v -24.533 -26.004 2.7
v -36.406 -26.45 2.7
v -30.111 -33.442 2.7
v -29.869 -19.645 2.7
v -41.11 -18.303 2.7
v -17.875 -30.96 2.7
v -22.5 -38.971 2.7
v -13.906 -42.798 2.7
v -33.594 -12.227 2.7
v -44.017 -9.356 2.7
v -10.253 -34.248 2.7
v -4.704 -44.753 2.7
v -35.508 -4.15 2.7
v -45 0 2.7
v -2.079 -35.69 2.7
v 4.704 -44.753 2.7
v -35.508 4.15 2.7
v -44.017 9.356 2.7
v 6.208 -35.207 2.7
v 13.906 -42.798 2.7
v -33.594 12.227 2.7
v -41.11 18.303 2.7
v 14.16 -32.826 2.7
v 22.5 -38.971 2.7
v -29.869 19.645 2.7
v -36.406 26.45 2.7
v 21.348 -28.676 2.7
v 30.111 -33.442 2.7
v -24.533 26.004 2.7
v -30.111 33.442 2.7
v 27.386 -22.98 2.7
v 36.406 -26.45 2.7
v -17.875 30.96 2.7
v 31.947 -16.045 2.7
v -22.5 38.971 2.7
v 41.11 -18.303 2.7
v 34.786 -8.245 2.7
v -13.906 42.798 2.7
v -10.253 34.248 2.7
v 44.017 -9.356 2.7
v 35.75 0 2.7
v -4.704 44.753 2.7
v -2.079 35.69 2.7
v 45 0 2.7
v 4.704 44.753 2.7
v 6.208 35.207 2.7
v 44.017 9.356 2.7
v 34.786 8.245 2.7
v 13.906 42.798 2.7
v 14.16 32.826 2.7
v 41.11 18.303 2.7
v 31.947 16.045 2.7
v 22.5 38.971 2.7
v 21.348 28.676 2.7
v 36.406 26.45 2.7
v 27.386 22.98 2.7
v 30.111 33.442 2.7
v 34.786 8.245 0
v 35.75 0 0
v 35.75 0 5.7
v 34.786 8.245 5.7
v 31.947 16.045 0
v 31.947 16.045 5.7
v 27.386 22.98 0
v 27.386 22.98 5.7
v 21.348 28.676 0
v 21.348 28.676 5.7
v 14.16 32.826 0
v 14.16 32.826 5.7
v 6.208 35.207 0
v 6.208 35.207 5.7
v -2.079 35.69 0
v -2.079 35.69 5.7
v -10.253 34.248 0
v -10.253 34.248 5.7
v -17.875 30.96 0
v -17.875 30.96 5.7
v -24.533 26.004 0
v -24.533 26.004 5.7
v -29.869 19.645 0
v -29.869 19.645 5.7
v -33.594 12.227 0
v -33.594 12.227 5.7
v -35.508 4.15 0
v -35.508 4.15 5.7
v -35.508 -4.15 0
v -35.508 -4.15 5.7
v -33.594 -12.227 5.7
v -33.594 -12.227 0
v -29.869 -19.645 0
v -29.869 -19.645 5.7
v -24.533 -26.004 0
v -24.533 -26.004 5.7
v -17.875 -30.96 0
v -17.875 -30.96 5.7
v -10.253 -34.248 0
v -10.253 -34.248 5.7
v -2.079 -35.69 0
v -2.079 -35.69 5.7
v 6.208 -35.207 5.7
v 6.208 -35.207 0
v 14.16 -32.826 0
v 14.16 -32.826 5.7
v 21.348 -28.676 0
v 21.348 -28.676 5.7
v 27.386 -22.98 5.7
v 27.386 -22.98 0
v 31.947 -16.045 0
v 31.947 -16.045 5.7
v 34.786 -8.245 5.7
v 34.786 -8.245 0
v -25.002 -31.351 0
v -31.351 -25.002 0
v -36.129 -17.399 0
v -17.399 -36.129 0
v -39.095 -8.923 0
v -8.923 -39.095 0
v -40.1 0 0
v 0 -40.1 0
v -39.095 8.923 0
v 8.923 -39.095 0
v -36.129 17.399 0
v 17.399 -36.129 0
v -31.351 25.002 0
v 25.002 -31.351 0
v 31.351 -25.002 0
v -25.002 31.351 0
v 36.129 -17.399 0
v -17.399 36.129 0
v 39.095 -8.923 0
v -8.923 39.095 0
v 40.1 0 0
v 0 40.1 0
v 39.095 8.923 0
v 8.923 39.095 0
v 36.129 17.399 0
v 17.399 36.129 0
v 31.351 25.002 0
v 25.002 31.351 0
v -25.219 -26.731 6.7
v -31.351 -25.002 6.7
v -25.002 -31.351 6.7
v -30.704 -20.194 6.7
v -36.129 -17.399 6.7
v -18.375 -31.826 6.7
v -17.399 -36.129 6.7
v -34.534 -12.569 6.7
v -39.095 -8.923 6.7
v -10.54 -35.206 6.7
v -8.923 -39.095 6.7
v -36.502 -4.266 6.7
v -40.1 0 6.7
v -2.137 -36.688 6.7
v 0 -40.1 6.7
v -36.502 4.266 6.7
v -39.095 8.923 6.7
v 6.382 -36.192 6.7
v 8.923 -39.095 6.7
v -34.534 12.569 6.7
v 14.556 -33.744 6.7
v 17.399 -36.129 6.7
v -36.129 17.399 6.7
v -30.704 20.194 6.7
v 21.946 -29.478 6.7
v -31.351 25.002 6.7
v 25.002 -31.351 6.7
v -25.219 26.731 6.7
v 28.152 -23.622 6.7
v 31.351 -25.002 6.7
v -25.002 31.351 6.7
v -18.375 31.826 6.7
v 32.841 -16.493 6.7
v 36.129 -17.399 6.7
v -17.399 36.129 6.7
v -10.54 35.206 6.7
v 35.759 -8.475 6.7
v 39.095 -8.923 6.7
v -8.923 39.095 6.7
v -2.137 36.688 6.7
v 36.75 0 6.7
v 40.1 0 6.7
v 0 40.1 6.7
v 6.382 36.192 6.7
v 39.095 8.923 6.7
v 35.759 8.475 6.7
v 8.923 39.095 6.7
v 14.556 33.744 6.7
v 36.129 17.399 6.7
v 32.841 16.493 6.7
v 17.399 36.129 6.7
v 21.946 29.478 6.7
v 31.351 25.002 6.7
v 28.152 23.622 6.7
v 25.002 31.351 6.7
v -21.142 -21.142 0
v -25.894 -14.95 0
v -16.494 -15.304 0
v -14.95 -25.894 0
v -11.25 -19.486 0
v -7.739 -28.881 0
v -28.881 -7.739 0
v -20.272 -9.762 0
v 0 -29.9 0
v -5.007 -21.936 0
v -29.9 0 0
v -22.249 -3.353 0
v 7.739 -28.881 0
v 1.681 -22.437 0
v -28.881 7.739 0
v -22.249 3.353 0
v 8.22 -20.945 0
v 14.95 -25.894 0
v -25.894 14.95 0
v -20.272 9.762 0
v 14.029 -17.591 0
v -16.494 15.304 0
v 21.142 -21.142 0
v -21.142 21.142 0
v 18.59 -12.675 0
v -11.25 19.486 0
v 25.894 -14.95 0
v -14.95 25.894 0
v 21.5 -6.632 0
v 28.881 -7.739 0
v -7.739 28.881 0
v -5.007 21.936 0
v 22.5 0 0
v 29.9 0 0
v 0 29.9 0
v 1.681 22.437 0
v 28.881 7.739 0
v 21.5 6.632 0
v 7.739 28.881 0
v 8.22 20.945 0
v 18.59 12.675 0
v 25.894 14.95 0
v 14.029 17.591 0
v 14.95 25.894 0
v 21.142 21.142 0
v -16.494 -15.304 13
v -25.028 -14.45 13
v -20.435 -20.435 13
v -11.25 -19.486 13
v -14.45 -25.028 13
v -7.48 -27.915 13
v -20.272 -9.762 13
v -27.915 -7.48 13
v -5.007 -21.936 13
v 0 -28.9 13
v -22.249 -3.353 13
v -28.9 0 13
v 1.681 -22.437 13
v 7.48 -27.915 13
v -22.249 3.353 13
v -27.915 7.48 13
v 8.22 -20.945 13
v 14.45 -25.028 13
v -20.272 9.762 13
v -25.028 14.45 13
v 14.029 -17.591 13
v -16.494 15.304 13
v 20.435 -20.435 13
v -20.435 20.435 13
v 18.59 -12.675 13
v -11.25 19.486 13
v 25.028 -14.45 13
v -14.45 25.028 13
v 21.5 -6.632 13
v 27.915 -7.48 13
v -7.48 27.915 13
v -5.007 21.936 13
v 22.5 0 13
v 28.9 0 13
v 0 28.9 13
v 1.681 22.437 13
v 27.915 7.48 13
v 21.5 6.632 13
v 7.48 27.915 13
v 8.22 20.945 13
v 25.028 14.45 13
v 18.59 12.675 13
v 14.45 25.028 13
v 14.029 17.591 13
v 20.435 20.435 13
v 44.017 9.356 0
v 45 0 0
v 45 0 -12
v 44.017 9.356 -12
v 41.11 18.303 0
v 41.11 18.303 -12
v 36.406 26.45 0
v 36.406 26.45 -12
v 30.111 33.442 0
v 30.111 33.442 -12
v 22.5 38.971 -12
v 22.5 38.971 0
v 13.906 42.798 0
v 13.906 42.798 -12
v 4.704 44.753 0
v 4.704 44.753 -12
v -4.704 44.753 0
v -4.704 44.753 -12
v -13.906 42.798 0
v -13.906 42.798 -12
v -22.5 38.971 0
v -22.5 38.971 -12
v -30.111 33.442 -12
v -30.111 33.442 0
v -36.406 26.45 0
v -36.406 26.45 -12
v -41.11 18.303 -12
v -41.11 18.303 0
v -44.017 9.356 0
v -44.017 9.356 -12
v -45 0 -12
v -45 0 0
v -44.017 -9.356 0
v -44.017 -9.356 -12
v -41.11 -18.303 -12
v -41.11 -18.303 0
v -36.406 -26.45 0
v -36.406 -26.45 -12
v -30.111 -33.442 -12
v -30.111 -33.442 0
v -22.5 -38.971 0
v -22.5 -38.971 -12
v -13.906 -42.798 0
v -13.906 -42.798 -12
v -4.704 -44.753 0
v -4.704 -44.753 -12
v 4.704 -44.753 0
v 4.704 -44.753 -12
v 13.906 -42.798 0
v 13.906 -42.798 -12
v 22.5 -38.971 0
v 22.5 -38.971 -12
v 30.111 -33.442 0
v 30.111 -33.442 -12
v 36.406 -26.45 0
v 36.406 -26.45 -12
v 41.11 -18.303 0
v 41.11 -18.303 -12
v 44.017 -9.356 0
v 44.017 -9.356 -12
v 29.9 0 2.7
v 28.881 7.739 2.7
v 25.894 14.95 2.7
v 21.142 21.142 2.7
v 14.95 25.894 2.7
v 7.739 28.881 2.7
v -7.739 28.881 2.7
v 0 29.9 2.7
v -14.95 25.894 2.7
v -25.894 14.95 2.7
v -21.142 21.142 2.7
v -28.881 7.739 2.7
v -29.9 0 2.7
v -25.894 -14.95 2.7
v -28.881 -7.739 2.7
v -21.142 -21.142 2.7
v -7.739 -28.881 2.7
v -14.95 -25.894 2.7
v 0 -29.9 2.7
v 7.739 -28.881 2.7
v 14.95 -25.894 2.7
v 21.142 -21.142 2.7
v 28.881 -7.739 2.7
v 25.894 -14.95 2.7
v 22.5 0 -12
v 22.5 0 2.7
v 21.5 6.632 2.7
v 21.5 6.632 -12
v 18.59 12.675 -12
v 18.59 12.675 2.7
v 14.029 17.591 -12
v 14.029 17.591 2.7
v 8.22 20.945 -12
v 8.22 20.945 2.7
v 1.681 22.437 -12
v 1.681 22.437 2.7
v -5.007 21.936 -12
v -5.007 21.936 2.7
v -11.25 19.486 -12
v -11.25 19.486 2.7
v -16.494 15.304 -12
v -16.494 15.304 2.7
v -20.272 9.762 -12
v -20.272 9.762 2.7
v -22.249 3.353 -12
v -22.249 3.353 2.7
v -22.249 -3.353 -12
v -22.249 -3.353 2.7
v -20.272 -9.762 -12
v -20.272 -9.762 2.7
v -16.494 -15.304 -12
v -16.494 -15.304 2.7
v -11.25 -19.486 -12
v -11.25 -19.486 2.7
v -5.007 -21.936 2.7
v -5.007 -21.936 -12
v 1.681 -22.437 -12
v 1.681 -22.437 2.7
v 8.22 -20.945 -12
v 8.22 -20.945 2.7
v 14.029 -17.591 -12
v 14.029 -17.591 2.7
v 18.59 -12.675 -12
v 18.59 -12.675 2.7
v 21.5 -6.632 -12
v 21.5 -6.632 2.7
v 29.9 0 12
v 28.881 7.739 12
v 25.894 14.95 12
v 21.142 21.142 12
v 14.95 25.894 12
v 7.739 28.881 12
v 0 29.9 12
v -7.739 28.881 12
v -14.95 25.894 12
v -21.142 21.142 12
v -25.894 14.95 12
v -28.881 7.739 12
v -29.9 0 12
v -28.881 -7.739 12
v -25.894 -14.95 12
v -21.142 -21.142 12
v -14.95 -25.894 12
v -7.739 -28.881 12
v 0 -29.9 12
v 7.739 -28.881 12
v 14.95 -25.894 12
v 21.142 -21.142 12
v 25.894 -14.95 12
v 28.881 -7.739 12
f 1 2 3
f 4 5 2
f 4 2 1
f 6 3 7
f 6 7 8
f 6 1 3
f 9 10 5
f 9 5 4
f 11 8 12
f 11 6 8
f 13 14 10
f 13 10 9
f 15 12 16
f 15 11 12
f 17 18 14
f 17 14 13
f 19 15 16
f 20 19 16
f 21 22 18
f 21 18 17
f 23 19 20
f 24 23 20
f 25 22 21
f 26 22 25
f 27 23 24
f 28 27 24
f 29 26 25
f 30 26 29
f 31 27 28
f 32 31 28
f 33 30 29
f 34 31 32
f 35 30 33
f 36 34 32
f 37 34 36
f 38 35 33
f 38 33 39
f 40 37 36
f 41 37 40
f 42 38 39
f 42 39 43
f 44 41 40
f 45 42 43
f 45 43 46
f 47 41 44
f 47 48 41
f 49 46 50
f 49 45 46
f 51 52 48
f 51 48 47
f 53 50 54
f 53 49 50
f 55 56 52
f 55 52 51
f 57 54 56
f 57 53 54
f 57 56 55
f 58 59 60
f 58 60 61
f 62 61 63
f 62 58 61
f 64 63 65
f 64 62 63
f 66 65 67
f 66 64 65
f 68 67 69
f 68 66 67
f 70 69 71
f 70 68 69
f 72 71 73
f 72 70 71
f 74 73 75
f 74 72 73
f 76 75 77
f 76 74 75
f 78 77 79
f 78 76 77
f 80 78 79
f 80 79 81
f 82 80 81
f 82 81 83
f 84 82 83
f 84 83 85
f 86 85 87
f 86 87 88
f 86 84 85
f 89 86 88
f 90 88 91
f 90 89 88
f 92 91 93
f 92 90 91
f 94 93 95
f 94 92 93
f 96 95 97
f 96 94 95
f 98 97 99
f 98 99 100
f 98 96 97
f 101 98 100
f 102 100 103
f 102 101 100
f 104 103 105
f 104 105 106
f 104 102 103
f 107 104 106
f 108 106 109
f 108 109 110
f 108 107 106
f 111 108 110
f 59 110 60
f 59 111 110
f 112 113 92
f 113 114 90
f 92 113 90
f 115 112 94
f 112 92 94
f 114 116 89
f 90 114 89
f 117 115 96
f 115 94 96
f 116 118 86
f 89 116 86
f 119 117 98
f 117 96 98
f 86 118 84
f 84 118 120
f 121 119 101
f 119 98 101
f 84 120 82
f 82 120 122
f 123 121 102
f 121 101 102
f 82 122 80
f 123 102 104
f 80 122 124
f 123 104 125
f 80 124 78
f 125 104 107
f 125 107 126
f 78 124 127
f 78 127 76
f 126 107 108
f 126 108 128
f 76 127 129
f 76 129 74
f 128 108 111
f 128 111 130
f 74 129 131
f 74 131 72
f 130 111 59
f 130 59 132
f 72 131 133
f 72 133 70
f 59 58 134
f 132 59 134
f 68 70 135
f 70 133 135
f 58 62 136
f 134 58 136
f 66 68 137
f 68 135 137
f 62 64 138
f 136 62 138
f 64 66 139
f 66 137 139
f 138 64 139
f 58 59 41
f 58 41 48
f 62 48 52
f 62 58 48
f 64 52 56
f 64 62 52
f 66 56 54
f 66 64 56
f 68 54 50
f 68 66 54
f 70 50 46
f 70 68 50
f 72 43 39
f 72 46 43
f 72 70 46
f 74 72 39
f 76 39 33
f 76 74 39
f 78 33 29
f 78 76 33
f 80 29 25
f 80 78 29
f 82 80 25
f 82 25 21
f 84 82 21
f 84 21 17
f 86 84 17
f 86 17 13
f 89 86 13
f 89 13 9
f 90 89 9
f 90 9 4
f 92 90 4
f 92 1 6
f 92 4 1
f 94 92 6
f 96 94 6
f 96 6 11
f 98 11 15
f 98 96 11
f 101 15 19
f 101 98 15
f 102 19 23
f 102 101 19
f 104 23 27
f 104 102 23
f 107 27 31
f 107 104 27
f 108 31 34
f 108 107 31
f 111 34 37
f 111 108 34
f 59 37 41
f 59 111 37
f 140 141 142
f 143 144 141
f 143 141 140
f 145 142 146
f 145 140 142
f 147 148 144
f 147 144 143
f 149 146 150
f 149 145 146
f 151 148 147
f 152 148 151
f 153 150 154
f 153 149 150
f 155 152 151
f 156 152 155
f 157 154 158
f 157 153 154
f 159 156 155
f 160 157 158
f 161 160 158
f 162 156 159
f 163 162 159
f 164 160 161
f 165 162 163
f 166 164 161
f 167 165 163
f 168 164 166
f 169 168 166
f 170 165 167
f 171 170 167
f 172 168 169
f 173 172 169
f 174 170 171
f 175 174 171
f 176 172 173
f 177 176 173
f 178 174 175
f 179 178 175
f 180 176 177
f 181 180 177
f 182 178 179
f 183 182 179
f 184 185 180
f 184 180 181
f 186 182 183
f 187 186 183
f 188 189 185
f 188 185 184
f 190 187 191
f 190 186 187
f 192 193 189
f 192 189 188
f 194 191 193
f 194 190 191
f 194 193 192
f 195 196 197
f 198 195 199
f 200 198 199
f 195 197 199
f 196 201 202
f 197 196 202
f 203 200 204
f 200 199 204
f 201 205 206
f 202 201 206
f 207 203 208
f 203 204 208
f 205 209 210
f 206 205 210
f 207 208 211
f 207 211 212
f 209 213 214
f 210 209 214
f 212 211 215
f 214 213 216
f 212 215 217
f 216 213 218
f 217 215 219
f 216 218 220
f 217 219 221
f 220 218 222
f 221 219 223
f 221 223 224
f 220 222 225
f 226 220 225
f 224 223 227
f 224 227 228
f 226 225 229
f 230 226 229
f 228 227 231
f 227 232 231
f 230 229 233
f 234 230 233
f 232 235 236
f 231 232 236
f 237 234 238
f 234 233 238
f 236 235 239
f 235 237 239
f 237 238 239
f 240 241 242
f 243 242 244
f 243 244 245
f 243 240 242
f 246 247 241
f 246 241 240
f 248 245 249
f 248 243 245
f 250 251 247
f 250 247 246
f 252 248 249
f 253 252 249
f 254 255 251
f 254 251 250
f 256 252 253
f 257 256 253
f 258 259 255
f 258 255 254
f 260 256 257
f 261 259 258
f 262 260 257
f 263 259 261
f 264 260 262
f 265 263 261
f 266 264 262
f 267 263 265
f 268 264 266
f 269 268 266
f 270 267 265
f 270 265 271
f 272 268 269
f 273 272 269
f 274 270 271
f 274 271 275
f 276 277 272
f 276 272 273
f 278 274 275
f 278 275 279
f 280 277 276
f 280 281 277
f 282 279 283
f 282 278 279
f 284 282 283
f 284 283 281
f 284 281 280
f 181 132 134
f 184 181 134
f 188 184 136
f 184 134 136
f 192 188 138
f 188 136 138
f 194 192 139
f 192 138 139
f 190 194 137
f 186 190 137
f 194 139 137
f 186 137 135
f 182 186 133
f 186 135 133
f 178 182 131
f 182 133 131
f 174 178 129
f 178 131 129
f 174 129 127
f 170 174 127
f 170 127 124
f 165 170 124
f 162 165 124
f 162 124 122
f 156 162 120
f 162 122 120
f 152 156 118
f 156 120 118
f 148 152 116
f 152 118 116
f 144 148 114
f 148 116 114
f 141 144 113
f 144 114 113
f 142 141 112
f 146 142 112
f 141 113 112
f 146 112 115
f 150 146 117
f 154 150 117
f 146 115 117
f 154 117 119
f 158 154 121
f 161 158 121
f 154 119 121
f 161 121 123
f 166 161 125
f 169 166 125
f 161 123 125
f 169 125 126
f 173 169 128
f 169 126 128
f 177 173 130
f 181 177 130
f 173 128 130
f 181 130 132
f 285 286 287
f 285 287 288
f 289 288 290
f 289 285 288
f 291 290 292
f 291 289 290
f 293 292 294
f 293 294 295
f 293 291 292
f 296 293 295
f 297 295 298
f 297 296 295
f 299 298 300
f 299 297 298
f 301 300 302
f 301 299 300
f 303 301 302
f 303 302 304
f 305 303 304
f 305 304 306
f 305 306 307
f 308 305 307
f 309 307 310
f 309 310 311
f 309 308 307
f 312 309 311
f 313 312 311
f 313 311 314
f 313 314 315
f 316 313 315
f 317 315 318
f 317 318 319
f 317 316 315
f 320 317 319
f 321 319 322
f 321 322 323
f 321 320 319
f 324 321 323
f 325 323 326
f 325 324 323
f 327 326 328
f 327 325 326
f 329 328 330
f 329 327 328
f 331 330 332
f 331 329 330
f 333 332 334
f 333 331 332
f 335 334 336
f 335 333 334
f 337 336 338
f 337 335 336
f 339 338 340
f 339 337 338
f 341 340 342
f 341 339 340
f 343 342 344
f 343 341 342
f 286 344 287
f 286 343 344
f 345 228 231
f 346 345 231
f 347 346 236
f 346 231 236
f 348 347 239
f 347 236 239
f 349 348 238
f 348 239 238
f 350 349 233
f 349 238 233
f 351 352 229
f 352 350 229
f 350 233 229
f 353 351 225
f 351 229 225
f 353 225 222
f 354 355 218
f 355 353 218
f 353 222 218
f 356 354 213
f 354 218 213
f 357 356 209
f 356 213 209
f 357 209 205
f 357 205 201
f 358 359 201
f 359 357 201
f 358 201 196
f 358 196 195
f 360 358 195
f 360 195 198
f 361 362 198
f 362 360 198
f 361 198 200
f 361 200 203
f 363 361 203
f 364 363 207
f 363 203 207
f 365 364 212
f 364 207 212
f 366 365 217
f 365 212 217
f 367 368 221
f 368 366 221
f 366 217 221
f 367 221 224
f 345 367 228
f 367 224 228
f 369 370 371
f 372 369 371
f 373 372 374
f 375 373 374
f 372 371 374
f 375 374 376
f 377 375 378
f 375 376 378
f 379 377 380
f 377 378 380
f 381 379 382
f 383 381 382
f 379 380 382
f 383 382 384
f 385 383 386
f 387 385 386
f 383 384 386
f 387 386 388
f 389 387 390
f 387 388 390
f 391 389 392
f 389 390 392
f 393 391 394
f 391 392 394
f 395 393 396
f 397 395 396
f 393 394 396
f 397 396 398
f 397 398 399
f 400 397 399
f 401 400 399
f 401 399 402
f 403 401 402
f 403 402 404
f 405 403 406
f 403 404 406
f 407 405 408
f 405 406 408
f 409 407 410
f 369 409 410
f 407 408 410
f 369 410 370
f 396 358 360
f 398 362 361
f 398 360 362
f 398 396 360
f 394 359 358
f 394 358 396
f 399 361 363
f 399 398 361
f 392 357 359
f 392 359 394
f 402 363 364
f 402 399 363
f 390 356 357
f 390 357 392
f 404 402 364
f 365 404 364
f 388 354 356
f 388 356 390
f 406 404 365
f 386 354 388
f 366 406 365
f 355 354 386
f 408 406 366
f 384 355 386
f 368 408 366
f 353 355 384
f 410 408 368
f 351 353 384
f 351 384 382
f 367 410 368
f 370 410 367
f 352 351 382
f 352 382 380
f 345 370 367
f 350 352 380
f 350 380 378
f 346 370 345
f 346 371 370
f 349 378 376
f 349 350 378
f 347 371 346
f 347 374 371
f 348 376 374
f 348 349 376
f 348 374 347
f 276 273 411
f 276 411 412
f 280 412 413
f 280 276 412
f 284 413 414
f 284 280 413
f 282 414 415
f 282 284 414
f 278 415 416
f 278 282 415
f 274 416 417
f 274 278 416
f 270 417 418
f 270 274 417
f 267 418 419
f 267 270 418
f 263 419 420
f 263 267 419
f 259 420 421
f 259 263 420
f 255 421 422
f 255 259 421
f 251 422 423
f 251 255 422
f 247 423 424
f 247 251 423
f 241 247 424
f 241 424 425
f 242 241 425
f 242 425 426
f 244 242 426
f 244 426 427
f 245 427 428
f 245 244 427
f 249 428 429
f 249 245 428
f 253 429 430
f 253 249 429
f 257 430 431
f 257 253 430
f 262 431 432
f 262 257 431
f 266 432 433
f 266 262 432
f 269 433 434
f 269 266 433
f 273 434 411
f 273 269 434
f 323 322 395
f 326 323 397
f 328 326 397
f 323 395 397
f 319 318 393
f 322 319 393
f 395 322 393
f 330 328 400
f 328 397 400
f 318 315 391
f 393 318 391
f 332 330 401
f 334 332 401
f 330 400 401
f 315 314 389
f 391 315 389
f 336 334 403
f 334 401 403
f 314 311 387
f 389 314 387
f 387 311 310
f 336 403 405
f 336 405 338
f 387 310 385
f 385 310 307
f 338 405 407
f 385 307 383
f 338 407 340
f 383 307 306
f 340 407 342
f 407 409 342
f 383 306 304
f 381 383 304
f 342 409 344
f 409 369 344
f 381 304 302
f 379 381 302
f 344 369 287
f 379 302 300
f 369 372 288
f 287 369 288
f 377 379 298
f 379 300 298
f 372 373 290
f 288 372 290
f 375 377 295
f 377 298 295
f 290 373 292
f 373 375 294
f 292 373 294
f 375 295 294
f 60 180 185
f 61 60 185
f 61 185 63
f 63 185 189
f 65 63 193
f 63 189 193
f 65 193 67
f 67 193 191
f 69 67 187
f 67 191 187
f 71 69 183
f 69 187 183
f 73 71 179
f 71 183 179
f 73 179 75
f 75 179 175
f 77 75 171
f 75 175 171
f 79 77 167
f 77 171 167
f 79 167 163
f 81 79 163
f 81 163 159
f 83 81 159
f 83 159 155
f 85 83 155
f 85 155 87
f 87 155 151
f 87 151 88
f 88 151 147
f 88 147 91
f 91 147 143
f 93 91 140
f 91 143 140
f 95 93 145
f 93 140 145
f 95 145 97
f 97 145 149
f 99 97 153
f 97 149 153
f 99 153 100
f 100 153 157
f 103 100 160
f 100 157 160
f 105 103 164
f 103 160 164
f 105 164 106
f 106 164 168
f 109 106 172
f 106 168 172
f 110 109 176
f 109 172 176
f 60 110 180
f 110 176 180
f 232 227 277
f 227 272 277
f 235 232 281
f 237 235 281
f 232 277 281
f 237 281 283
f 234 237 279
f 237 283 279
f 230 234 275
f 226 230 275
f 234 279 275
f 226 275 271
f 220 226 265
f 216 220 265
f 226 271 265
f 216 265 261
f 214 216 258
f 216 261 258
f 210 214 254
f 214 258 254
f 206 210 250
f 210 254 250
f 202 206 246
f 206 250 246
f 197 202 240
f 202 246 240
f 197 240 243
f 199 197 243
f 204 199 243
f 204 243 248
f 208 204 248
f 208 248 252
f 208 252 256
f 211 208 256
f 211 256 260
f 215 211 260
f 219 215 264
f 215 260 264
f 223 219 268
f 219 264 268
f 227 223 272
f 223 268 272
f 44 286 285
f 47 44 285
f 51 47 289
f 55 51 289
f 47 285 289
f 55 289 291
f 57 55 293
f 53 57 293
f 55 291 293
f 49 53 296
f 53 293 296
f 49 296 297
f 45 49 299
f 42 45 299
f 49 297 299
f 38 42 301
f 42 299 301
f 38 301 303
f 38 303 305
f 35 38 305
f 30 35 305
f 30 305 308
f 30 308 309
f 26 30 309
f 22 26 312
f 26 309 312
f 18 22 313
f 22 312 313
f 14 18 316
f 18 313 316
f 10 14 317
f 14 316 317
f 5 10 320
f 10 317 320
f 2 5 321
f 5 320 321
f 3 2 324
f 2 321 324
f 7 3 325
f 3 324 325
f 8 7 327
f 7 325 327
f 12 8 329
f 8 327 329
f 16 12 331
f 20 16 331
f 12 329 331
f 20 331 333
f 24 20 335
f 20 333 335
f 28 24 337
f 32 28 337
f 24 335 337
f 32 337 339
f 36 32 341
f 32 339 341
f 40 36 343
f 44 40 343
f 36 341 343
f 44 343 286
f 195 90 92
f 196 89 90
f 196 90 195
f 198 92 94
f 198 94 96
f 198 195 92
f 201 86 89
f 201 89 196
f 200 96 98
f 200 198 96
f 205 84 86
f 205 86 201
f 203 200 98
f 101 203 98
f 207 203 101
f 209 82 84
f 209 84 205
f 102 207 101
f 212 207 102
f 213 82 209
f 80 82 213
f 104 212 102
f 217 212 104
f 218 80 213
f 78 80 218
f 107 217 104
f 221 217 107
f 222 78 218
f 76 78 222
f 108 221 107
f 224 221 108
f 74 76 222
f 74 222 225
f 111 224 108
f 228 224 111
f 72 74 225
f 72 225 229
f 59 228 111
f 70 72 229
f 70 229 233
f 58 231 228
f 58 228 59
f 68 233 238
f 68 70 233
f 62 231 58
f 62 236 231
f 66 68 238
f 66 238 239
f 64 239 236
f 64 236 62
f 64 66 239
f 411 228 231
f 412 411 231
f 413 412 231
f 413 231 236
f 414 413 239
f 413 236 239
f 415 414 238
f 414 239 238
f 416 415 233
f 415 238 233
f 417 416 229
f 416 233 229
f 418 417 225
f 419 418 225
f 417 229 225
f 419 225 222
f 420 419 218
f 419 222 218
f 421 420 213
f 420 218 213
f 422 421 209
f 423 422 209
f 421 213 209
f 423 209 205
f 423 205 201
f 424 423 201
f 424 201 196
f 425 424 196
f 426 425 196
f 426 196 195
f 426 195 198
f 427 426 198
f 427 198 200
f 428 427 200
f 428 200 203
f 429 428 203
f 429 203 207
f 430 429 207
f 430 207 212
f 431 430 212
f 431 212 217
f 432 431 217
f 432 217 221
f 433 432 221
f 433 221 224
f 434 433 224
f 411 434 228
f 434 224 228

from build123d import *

# Parameters (mm, degrees)
F0_R          = 29.9
F3_DEPTH      = 6.7
F0_R_2        = 40.1
F0_R_3        = 35.75
F1_R          = 45
F4_DEPTH      = 12
F4_DEPTH_BACK = 2.7
F5_DEPTH      = 6.7
F6_SIZE       = 1
F7_DEPTH      = 6.3
F8_SIZE       = 1
F2_R          = 22.5
F9_DEPTH      = 13
F9_DEPTH_BACK = 12


with BuildPart() as f3:
    # F0 (on Top) → F3 (new body)
    with BuildSketch(Plane.XY):
        Circle(F0_R)
    extrude(amount=F3_DEPTH)

    # F7 (add): a face of the model
    f7_faces = [f3.faces().sort_by_distance(p)[0] for p in [
        (0, 0, 6.7),
    ]]
    extrude(f7_faces, amount=F7_DEPTH)

    # F8
    f8_edges = [f3.edges().sort_by_distance(p)[0] for p in [
        (-29.9, 0, 13),
    ]]
    chamfer(f8_edges, length=F8_SIZE)


with BuildPart() as f3b:
    # F0 (on Top) → F3, piece 2 (new body)
    with BuildSketch(Plane.XY):
        Circle(F0_R_2)
        Circle(F0_R_3, mode=Mode.SUBTRACT)
    extrude(amount=F3_DEPTH)

    # F6
    f6_edges = [f3b.edges().sort_by_distance(p)[0] for p in [
        (-35.75, 0, 6.7),
    ]]
    chamfer(f6_edges, length=F6_SIZE)


with BuildPart() as f4:
    # F1 (on Top) → F4 (new body, two sides)
    with BuildSketch(Plane.XY) as f4_sk:
        Circle(F1_R)
    extrude(amount=-F4_DEPTH)
    extrude(f4_sk.sketch, amount=F4_DEPTH_BACK)

    # F0 (on Top) → F5 (cut)
    with BuildSketch(Plane.XY):
        Circle(F0_R_3)
        Circle(F0_R, mode=Mode.SUBTRACT)
    extrude(amount=F5_DEPTH, mode=Mode.SUBTRACT)


with BuildPart() as f9_tool:
    # F2 (on Top) → F9 (new body, two sides)
    with BuildSketch(Plane.XY) as f9_sk:
        Circle(F2_R)
    extrude(amount=F9_DEPTH)
    extrude(f9_sk.sketch, amount=-F9_DEPTH_BACK)


with BuildPart() as f3_1:
    add(f3.part)

    # F9: cut by f9_tool
    add(f9_tool.part, mode=Mode.SUBTRACT)


with BuildPart() as f4_1:
    add(f4.part)

    # F9: cut by f9_tool
    add(f9_tool.part, mode=Mode.SUBTRACT)


solid = Compound([f3b.part, f3_1.part, f4_1.part])
